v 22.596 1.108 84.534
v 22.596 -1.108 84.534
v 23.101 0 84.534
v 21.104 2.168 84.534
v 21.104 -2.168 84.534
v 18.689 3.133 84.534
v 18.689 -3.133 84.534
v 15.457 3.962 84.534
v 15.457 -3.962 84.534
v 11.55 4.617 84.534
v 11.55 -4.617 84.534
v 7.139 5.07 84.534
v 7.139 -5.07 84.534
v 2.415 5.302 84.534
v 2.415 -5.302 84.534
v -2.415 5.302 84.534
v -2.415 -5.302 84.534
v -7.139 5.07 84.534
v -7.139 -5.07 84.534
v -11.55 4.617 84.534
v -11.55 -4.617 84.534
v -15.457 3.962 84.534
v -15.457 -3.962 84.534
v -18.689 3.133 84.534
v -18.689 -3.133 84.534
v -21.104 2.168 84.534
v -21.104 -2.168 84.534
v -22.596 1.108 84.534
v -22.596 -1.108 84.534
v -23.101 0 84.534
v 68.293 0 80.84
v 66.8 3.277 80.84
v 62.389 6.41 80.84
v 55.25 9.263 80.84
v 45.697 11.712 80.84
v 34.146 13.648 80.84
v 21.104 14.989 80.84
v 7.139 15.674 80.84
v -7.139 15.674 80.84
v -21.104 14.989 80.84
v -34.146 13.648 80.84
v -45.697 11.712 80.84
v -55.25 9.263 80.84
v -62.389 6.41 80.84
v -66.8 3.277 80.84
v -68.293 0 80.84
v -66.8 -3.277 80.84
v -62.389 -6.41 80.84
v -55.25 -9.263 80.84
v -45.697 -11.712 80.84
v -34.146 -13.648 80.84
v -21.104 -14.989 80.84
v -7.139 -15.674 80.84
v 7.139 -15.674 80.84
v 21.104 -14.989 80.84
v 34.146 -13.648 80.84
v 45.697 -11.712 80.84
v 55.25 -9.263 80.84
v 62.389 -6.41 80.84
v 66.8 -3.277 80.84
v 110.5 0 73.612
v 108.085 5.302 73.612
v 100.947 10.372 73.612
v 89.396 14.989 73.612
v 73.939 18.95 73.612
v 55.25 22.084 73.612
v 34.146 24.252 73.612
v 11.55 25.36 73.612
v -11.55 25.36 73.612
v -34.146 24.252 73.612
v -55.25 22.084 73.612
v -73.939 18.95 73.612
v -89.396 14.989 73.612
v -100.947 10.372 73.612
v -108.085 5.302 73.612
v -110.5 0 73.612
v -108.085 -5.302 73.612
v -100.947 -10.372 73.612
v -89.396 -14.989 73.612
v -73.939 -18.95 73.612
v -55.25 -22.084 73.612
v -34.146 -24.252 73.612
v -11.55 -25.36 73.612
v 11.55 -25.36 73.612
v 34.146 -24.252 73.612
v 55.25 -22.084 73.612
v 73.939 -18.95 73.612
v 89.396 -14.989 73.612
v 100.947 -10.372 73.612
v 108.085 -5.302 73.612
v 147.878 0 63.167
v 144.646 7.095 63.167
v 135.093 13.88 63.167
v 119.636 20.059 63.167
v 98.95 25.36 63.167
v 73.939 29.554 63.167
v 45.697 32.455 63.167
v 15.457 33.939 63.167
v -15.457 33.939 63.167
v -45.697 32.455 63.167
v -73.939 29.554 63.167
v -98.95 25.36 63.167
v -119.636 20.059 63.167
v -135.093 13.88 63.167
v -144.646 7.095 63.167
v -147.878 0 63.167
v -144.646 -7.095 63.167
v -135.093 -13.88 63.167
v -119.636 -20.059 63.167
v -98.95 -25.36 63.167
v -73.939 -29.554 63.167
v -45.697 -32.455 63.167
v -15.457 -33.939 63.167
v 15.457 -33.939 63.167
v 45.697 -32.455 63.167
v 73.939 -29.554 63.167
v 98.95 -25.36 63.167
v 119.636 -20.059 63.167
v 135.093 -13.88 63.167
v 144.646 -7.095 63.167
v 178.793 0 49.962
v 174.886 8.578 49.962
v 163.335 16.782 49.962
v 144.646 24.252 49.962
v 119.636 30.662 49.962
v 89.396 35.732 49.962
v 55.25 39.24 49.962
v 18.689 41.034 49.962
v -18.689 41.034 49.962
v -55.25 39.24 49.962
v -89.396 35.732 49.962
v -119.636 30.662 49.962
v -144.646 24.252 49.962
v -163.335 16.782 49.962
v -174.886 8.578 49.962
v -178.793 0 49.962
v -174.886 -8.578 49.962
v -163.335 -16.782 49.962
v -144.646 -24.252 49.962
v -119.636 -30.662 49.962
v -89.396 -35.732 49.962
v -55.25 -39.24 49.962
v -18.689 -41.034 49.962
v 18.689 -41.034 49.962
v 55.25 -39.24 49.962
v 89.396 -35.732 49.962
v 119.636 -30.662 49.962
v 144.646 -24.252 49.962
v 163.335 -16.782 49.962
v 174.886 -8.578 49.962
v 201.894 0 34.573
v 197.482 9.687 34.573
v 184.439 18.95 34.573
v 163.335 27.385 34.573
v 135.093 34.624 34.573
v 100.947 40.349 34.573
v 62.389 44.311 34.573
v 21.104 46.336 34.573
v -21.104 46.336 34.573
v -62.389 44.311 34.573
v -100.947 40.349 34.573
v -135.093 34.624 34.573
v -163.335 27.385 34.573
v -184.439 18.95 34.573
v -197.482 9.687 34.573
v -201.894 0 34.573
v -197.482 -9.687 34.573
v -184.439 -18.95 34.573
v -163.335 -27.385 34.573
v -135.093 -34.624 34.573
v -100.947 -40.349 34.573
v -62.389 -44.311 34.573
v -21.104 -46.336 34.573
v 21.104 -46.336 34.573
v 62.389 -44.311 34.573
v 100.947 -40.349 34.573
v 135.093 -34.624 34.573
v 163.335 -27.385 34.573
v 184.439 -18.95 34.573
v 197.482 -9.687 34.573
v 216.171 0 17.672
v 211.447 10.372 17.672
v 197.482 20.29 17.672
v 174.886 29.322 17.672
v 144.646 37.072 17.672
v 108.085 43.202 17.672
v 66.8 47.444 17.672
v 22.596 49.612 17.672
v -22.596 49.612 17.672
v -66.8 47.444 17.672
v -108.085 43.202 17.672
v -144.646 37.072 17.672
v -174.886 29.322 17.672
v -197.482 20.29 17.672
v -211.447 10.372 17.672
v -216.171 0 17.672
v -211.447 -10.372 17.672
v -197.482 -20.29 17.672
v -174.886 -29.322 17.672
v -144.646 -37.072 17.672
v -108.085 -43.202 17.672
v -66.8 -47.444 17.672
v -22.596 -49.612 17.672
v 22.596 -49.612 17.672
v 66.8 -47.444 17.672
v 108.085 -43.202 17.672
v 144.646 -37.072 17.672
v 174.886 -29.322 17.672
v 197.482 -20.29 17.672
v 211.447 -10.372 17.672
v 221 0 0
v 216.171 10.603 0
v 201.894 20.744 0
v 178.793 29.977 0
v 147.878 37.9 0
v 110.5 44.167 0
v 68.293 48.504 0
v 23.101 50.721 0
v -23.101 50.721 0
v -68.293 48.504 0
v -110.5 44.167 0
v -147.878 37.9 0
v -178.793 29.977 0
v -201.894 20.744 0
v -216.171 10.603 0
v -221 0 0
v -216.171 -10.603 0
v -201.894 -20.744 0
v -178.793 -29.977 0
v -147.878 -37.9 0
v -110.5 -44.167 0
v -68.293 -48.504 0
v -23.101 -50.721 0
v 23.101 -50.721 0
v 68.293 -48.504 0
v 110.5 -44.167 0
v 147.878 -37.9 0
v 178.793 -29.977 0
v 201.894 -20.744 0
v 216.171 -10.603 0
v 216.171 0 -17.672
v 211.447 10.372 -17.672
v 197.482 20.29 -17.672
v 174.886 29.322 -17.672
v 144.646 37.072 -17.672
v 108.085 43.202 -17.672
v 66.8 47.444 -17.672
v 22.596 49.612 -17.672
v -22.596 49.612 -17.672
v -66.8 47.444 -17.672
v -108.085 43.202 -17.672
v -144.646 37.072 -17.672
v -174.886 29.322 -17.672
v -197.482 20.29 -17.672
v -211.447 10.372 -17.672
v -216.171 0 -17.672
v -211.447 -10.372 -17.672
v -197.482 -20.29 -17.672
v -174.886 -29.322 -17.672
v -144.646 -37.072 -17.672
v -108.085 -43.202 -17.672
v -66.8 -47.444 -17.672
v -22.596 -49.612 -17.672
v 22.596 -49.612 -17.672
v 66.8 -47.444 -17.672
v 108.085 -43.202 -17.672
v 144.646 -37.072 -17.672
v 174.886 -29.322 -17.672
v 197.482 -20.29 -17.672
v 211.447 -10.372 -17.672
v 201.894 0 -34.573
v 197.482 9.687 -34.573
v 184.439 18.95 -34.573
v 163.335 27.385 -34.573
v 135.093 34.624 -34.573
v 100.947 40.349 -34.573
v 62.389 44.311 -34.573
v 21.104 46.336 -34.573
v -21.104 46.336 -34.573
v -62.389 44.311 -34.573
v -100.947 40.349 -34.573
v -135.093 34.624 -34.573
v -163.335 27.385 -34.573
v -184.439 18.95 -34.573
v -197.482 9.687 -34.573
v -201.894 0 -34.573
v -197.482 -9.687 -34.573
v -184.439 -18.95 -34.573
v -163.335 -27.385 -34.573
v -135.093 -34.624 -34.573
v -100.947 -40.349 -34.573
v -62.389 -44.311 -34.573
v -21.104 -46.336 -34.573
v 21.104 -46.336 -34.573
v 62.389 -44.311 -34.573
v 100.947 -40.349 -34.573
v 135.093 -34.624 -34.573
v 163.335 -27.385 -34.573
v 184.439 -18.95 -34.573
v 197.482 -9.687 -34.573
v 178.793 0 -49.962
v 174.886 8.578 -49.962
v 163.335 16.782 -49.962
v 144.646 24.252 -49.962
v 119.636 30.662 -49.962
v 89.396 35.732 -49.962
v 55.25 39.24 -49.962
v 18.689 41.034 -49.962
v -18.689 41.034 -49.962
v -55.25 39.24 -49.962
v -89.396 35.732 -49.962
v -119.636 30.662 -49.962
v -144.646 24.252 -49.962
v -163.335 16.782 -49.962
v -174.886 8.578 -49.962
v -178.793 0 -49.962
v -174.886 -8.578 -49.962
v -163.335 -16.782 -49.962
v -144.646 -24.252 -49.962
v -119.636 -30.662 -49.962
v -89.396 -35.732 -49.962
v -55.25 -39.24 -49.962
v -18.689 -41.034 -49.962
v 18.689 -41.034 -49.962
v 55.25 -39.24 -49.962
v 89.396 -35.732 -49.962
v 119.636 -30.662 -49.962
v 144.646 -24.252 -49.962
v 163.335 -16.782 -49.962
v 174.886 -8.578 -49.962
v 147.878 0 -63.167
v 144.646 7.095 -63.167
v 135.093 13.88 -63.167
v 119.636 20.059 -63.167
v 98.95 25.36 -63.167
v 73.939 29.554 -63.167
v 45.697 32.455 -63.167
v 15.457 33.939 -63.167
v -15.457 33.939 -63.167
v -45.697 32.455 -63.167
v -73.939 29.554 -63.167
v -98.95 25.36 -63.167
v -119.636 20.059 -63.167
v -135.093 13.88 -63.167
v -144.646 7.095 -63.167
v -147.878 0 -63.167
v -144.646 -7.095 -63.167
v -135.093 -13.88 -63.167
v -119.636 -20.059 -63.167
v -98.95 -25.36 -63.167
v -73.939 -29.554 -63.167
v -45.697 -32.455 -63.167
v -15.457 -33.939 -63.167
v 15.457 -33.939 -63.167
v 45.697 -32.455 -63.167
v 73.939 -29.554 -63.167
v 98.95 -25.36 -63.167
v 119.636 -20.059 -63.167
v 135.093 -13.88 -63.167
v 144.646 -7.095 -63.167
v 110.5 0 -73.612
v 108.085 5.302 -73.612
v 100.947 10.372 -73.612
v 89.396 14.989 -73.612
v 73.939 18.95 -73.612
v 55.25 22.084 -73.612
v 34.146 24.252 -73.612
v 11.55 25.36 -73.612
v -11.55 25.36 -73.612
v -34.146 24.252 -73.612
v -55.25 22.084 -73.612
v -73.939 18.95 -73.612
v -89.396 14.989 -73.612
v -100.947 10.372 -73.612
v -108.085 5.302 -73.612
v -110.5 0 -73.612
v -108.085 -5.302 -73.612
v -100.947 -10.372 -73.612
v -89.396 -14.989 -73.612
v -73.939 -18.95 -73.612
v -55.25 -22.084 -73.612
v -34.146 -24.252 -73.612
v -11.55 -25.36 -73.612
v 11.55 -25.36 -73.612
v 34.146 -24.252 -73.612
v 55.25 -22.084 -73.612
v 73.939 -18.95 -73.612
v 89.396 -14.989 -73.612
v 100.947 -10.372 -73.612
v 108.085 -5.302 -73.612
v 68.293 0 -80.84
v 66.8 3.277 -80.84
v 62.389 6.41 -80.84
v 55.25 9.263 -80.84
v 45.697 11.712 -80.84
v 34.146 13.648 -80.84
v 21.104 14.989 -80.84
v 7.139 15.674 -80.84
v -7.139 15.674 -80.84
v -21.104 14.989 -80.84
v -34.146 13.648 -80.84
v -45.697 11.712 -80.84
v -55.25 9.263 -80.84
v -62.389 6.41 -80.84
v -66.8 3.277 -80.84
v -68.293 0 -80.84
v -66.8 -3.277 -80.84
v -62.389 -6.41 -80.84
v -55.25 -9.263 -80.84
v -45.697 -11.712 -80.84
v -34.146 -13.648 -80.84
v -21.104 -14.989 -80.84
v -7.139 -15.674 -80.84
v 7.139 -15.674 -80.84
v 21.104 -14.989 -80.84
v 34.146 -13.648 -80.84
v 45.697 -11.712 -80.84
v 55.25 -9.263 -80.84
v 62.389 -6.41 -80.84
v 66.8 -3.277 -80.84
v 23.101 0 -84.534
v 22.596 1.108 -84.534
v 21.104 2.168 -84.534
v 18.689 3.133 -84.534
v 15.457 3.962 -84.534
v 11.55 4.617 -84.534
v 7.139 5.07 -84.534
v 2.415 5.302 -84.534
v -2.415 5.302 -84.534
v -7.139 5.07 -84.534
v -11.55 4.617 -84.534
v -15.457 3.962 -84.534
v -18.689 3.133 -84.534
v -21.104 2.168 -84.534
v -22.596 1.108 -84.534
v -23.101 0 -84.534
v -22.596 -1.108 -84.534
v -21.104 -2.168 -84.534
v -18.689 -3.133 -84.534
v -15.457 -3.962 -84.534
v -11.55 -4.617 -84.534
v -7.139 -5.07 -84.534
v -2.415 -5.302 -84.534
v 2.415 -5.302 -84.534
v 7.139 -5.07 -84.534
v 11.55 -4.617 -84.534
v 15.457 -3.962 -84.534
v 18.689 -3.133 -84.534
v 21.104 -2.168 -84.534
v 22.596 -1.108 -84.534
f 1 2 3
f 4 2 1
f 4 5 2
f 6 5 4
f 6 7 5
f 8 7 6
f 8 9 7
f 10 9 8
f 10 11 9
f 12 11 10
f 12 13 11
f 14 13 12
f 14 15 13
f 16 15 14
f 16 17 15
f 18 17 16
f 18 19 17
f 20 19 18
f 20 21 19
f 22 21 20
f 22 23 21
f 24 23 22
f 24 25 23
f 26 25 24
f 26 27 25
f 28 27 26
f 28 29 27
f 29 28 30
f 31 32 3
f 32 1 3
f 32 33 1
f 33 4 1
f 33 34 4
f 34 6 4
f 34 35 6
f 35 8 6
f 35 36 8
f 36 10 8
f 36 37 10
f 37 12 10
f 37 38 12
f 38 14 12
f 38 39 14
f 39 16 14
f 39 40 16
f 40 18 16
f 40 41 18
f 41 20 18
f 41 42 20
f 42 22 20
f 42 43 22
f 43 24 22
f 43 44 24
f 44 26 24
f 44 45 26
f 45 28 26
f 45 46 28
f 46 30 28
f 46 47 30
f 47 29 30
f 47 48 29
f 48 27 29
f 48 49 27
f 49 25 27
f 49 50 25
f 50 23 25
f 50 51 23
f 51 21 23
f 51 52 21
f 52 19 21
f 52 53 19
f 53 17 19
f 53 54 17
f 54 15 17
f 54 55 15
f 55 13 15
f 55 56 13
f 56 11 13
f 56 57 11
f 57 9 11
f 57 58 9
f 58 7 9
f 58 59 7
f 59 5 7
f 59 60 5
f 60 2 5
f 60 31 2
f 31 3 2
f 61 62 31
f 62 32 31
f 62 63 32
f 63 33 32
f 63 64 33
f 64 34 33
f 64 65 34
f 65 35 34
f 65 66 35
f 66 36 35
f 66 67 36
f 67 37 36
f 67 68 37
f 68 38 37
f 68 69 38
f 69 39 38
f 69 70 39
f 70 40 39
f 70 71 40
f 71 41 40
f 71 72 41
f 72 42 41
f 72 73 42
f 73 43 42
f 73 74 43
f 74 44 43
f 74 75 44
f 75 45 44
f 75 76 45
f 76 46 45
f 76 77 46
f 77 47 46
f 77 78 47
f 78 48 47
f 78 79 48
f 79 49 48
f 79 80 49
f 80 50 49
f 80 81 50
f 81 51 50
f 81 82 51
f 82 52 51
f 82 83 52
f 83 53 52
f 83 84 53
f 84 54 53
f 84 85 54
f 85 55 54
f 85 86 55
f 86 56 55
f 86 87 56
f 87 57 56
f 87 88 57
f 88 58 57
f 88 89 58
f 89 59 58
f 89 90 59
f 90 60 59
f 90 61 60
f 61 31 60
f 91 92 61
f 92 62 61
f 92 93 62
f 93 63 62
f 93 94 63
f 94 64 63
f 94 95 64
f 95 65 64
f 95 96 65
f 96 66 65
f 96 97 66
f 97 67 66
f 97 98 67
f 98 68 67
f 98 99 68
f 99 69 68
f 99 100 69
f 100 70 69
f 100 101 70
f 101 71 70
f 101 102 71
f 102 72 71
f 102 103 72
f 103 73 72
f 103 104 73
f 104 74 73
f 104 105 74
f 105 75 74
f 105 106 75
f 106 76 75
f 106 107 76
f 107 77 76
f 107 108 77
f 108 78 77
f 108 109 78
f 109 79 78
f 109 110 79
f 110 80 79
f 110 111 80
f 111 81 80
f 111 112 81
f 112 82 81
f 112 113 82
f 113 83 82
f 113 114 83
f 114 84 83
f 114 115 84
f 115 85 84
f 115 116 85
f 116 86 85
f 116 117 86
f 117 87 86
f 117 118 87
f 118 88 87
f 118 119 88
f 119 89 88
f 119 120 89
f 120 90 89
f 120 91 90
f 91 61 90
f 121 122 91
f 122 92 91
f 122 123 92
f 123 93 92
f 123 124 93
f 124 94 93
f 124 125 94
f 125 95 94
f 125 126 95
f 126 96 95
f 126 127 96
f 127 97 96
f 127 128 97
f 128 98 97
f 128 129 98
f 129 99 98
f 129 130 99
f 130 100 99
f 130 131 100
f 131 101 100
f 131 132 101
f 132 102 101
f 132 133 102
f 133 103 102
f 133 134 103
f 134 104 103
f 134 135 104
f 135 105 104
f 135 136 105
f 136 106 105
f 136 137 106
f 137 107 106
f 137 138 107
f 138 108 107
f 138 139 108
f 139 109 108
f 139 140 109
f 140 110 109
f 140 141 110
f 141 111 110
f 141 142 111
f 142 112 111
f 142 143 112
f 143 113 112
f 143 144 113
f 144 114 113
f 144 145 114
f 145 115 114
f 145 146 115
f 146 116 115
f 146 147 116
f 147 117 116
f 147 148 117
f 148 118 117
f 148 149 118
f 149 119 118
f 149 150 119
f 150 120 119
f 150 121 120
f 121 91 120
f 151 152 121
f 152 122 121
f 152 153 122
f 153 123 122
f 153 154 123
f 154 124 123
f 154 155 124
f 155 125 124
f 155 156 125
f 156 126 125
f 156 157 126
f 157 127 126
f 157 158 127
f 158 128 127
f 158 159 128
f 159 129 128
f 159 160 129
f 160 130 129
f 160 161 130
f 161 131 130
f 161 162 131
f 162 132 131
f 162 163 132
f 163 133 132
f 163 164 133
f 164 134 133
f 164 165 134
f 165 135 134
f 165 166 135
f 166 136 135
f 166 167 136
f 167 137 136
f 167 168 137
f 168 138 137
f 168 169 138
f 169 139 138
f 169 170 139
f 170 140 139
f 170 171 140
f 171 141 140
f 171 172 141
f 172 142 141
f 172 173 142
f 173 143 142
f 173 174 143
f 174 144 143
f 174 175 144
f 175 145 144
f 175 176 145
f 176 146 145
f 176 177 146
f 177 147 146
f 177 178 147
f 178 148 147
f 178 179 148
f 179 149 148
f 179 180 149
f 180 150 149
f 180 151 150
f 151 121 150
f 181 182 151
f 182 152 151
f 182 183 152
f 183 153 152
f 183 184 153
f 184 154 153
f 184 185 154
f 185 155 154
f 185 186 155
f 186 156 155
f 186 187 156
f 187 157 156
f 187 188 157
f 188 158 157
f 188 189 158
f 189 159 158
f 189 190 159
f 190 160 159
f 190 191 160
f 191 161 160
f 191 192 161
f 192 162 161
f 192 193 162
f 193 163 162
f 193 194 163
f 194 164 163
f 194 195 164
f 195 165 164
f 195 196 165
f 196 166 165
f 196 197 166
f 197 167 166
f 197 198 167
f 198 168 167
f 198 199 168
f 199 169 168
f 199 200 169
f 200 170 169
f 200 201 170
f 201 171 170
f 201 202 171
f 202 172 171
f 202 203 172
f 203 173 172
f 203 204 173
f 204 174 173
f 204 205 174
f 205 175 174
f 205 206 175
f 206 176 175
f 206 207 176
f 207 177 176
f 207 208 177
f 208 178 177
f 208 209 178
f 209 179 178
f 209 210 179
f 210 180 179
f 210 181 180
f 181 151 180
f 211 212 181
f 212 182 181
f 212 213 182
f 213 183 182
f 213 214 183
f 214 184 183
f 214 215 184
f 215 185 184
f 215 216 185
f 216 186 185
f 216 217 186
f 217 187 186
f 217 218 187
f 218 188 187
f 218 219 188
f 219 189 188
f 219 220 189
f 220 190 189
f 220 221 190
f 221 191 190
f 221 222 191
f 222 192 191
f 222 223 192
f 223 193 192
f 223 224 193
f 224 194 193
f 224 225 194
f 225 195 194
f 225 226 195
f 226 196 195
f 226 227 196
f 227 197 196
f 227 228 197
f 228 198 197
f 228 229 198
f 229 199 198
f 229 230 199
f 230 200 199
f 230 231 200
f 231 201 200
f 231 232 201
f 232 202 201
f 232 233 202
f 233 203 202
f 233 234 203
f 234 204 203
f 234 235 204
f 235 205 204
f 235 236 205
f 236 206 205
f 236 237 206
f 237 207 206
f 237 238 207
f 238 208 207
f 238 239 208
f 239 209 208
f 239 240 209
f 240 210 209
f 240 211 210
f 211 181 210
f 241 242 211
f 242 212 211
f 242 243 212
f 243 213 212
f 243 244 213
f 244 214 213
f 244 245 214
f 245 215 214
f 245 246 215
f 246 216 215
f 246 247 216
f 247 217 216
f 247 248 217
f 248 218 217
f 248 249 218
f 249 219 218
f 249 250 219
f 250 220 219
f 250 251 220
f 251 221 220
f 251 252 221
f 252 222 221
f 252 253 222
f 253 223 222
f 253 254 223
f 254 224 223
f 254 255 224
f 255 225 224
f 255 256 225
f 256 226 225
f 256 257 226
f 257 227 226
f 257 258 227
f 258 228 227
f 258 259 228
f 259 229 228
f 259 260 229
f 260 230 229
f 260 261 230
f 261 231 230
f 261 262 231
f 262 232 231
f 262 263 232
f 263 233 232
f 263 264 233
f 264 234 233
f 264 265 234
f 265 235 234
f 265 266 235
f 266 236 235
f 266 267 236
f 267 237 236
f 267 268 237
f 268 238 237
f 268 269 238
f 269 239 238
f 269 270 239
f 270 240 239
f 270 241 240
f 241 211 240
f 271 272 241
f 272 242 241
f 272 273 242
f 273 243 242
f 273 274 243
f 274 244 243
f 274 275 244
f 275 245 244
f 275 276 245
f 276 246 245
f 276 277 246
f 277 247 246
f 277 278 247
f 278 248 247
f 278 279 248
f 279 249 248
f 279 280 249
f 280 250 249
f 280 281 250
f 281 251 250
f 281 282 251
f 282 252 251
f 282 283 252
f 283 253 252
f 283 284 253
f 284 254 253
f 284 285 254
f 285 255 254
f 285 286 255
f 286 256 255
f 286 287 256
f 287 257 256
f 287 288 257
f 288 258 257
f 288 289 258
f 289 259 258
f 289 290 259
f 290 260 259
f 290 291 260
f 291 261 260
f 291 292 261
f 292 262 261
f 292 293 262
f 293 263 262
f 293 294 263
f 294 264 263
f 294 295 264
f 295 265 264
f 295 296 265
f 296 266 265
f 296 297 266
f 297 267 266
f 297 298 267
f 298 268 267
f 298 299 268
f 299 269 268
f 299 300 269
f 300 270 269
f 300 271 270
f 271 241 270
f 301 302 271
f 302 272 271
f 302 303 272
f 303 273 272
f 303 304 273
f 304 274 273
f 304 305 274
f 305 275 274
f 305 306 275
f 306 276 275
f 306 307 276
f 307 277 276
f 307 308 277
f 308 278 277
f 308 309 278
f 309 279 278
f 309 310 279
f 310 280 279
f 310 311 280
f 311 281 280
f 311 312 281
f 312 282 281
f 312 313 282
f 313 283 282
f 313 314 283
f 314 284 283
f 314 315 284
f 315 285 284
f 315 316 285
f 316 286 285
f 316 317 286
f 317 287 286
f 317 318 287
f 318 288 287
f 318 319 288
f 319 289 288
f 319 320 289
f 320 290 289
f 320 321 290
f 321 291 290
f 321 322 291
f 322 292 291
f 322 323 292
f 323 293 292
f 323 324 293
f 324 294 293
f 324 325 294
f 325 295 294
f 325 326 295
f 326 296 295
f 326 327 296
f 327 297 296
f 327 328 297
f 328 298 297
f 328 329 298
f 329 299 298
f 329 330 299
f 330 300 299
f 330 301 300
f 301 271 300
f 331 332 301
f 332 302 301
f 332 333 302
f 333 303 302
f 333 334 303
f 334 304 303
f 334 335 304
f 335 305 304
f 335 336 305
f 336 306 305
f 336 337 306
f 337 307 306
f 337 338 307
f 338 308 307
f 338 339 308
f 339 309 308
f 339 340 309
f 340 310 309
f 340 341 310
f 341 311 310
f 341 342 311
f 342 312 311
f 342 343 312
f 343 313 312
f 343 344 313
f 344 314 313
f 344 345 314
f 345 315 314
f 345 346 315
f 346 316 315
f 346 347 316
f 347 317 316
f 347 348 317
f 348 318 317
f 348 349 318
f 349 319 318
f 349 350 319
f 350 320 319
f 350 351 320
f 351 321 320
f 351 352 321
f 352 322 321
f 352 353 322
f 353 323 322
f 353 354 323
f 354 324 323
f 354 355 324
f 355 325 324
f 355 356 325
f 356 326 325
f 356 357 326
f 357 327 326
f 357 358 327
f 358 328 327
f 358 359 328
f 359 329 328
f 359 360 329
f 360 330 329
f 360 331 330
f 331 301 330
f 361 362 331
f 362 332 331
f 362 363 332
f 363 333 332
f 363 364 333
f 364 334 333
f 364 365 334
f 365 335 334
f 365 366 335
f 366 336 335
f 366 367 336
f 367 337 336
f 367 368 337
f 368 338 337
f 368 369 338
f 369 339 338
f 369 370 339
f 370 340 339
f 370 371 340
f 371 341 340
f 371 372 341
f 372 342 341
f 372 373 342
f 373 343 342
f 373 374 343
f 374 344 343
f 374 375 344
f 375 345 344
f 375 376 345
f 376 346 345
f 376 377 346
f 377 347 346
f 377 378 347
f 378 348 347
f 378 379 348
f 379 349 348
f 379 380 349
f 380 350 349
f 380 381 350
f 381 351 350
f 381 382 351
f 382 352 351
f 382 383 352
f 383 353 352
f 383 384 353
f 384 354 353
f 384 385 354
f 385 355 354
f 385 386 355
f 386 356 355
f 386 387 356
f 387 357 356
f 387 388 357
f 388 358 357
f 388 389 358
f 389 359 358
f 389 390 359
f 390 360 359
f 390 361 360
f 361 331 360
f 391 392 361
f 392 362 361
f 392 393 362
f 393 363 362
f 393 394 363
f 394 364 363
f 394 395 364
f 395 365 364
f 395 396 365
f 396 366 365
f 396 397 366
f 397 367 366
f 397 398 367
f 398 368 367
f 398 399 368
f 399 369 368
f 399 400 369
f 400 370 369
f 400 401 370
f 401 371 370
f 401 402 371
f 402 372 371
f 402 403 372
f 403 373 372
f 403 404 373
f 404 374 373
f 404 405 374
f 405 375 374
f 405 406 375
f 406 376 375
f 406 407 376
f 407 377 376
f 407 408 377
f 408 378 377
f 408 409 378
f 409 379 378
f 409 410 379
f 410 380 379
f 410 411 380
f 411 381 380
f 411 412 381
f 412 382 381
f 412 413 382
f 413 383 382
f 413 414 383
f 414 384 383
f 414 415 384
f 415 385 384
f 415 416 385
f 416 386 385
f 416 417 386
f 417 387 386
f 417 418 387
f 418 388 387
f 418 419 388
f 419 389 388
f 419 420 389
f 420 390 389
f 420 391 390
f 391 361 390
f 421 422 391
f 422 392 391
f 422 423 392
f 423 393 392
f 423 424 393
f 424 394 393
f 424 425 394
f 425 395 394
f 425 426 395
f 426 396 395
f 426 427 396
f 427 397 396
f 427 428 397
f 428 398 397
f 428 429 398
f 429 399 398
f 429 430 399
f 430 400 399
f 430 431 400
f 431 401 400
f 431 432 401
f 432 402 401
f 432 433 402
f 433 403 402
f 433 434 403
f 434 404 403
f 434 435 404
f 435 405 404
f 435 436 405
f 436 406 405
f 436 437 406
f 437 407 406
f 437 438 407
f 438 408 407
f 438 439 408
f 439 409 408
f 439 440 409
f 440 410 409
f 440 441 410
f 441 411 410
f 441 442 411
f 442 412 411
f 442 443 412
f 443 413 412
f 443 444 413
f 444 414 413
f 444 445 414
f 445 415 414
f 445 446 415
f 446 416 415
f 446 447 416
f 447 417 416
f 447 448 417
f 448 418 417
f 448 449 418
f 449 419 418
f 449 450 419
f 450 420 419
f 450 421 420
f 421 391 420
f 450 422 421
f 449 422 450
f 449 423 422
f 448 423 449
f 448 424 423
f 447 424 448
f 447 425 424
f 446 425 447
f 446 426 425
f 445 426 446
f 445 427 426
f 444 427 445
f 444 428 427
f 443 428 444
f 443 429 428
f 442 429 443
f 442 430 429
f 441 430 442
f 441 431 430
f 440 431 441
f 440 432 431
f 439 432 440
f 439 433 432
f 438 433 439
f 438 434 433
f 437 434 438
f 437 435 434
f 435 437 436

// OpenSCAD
// Generated by SolidPython 1.0.1 on 2020-07-29 00:46:50


scale(v = [13, 3, 5]) {
	sphere(r = 17);
}
/***********************************************
*********      SolidPython code:      **********
************************************************
 
# import packages: SolidPython
from solid import *
from solid.utils import *
from itertools import chain, combinations, permutations


class Resize:

    def __init__(self, scad_file):
        self.scad_file = scad_file
        #self.scad_file = import_scad(scad_file)
        # cone/cylinder param:
        self.r1 = 0
        self.r2 = 0
        self.h = 0
        # rectangular prism param:
        self.w = 0
        self.l = 0
        # ellipse param:
        self.r = 0

    # import OpenScad code (file name corresponds to shape)


    # classify shape + parameters
    def assign(self, param1, param2, param3):
        if self.scad_file == 'cone.scad':
            self.r1 = param1
            self.r2 = param2
            self.h = param3
        elif self.scad_file == 'cylinder.scad':
            self.r1 = param1
            self.r2 = param2
            self.h = param3
        elif self.scad_file == 'rectangularPrism.scad':
            self.h = param1
            self.l = param2
            self.w = param3
        else:
            self.r = param1
            self.h = param2

    # resize parameters
    def iterate(self):
        x = range(3, 20, 2)
        i = 1
        if self.scad_file == 'cone.scad':
            tempList = list(permutations(x, 2))
            for temp in tempList:
                param1 = temp[0]
                param2 = temp[1]
                filepath = 'produced_scad_files/' + 'cone' + str(param1) + '_' + str(param2) + '_' + '.scad'
                scad_render_to_file(cylinder(h=param1, r1=param2, r2=0), filepath)

        elif self.scad_file == 'cylinder.scad':
            tempList = list(permutations(x, 3))
            for temp in tempList:
                param1 = temp[0]
                param2 = temp[1]
                filepath = 'produced_scad_files/' + 'cylinder' + str(param1) + '_' + str(param2) + '_' + '.scad'
                scad_render_to_file(cylinder(h=param1, r1=param2, r2=param2), filepath)

        elif self.scad_file == 'rectangularPrism.scad':
            tempList = list(permutations(x, 3))
            for temp in tempList:
                param1 = temp[0]
                param2 = temp[1]
                param3 = temp[2]
                filepath = 'produced_scad_files/' + 'rectangularPrism' + str(param1) + '_' + str(param2) + '_' + str(
                    param3) + '.scad'
                scad_render_to_file(cube(size=(param1, param2, param3)), filepath)

        elif self.scad_file == 'ellipse.scad':
            tempList = list(permutations(x, 4))
            for temp in tempList:
                param1 = temp[0]
                param2 = temp[1]
                param3 = temp[2]
                param4 = temp[3]
                filepath = 'produced_scad_files/' + 'ellipse' + str(param1) + '_' + str(param2) + '_' + str(param3) + '_' + str(param4) + '.scad'
                scad_render_to_file(scale([param1, param2, param3])(sphere(r=param4)), filepath)

    def render_to_scadfile(self):
        scad_render_to_file(scad, 'example.scad') 
 
************************************************/
